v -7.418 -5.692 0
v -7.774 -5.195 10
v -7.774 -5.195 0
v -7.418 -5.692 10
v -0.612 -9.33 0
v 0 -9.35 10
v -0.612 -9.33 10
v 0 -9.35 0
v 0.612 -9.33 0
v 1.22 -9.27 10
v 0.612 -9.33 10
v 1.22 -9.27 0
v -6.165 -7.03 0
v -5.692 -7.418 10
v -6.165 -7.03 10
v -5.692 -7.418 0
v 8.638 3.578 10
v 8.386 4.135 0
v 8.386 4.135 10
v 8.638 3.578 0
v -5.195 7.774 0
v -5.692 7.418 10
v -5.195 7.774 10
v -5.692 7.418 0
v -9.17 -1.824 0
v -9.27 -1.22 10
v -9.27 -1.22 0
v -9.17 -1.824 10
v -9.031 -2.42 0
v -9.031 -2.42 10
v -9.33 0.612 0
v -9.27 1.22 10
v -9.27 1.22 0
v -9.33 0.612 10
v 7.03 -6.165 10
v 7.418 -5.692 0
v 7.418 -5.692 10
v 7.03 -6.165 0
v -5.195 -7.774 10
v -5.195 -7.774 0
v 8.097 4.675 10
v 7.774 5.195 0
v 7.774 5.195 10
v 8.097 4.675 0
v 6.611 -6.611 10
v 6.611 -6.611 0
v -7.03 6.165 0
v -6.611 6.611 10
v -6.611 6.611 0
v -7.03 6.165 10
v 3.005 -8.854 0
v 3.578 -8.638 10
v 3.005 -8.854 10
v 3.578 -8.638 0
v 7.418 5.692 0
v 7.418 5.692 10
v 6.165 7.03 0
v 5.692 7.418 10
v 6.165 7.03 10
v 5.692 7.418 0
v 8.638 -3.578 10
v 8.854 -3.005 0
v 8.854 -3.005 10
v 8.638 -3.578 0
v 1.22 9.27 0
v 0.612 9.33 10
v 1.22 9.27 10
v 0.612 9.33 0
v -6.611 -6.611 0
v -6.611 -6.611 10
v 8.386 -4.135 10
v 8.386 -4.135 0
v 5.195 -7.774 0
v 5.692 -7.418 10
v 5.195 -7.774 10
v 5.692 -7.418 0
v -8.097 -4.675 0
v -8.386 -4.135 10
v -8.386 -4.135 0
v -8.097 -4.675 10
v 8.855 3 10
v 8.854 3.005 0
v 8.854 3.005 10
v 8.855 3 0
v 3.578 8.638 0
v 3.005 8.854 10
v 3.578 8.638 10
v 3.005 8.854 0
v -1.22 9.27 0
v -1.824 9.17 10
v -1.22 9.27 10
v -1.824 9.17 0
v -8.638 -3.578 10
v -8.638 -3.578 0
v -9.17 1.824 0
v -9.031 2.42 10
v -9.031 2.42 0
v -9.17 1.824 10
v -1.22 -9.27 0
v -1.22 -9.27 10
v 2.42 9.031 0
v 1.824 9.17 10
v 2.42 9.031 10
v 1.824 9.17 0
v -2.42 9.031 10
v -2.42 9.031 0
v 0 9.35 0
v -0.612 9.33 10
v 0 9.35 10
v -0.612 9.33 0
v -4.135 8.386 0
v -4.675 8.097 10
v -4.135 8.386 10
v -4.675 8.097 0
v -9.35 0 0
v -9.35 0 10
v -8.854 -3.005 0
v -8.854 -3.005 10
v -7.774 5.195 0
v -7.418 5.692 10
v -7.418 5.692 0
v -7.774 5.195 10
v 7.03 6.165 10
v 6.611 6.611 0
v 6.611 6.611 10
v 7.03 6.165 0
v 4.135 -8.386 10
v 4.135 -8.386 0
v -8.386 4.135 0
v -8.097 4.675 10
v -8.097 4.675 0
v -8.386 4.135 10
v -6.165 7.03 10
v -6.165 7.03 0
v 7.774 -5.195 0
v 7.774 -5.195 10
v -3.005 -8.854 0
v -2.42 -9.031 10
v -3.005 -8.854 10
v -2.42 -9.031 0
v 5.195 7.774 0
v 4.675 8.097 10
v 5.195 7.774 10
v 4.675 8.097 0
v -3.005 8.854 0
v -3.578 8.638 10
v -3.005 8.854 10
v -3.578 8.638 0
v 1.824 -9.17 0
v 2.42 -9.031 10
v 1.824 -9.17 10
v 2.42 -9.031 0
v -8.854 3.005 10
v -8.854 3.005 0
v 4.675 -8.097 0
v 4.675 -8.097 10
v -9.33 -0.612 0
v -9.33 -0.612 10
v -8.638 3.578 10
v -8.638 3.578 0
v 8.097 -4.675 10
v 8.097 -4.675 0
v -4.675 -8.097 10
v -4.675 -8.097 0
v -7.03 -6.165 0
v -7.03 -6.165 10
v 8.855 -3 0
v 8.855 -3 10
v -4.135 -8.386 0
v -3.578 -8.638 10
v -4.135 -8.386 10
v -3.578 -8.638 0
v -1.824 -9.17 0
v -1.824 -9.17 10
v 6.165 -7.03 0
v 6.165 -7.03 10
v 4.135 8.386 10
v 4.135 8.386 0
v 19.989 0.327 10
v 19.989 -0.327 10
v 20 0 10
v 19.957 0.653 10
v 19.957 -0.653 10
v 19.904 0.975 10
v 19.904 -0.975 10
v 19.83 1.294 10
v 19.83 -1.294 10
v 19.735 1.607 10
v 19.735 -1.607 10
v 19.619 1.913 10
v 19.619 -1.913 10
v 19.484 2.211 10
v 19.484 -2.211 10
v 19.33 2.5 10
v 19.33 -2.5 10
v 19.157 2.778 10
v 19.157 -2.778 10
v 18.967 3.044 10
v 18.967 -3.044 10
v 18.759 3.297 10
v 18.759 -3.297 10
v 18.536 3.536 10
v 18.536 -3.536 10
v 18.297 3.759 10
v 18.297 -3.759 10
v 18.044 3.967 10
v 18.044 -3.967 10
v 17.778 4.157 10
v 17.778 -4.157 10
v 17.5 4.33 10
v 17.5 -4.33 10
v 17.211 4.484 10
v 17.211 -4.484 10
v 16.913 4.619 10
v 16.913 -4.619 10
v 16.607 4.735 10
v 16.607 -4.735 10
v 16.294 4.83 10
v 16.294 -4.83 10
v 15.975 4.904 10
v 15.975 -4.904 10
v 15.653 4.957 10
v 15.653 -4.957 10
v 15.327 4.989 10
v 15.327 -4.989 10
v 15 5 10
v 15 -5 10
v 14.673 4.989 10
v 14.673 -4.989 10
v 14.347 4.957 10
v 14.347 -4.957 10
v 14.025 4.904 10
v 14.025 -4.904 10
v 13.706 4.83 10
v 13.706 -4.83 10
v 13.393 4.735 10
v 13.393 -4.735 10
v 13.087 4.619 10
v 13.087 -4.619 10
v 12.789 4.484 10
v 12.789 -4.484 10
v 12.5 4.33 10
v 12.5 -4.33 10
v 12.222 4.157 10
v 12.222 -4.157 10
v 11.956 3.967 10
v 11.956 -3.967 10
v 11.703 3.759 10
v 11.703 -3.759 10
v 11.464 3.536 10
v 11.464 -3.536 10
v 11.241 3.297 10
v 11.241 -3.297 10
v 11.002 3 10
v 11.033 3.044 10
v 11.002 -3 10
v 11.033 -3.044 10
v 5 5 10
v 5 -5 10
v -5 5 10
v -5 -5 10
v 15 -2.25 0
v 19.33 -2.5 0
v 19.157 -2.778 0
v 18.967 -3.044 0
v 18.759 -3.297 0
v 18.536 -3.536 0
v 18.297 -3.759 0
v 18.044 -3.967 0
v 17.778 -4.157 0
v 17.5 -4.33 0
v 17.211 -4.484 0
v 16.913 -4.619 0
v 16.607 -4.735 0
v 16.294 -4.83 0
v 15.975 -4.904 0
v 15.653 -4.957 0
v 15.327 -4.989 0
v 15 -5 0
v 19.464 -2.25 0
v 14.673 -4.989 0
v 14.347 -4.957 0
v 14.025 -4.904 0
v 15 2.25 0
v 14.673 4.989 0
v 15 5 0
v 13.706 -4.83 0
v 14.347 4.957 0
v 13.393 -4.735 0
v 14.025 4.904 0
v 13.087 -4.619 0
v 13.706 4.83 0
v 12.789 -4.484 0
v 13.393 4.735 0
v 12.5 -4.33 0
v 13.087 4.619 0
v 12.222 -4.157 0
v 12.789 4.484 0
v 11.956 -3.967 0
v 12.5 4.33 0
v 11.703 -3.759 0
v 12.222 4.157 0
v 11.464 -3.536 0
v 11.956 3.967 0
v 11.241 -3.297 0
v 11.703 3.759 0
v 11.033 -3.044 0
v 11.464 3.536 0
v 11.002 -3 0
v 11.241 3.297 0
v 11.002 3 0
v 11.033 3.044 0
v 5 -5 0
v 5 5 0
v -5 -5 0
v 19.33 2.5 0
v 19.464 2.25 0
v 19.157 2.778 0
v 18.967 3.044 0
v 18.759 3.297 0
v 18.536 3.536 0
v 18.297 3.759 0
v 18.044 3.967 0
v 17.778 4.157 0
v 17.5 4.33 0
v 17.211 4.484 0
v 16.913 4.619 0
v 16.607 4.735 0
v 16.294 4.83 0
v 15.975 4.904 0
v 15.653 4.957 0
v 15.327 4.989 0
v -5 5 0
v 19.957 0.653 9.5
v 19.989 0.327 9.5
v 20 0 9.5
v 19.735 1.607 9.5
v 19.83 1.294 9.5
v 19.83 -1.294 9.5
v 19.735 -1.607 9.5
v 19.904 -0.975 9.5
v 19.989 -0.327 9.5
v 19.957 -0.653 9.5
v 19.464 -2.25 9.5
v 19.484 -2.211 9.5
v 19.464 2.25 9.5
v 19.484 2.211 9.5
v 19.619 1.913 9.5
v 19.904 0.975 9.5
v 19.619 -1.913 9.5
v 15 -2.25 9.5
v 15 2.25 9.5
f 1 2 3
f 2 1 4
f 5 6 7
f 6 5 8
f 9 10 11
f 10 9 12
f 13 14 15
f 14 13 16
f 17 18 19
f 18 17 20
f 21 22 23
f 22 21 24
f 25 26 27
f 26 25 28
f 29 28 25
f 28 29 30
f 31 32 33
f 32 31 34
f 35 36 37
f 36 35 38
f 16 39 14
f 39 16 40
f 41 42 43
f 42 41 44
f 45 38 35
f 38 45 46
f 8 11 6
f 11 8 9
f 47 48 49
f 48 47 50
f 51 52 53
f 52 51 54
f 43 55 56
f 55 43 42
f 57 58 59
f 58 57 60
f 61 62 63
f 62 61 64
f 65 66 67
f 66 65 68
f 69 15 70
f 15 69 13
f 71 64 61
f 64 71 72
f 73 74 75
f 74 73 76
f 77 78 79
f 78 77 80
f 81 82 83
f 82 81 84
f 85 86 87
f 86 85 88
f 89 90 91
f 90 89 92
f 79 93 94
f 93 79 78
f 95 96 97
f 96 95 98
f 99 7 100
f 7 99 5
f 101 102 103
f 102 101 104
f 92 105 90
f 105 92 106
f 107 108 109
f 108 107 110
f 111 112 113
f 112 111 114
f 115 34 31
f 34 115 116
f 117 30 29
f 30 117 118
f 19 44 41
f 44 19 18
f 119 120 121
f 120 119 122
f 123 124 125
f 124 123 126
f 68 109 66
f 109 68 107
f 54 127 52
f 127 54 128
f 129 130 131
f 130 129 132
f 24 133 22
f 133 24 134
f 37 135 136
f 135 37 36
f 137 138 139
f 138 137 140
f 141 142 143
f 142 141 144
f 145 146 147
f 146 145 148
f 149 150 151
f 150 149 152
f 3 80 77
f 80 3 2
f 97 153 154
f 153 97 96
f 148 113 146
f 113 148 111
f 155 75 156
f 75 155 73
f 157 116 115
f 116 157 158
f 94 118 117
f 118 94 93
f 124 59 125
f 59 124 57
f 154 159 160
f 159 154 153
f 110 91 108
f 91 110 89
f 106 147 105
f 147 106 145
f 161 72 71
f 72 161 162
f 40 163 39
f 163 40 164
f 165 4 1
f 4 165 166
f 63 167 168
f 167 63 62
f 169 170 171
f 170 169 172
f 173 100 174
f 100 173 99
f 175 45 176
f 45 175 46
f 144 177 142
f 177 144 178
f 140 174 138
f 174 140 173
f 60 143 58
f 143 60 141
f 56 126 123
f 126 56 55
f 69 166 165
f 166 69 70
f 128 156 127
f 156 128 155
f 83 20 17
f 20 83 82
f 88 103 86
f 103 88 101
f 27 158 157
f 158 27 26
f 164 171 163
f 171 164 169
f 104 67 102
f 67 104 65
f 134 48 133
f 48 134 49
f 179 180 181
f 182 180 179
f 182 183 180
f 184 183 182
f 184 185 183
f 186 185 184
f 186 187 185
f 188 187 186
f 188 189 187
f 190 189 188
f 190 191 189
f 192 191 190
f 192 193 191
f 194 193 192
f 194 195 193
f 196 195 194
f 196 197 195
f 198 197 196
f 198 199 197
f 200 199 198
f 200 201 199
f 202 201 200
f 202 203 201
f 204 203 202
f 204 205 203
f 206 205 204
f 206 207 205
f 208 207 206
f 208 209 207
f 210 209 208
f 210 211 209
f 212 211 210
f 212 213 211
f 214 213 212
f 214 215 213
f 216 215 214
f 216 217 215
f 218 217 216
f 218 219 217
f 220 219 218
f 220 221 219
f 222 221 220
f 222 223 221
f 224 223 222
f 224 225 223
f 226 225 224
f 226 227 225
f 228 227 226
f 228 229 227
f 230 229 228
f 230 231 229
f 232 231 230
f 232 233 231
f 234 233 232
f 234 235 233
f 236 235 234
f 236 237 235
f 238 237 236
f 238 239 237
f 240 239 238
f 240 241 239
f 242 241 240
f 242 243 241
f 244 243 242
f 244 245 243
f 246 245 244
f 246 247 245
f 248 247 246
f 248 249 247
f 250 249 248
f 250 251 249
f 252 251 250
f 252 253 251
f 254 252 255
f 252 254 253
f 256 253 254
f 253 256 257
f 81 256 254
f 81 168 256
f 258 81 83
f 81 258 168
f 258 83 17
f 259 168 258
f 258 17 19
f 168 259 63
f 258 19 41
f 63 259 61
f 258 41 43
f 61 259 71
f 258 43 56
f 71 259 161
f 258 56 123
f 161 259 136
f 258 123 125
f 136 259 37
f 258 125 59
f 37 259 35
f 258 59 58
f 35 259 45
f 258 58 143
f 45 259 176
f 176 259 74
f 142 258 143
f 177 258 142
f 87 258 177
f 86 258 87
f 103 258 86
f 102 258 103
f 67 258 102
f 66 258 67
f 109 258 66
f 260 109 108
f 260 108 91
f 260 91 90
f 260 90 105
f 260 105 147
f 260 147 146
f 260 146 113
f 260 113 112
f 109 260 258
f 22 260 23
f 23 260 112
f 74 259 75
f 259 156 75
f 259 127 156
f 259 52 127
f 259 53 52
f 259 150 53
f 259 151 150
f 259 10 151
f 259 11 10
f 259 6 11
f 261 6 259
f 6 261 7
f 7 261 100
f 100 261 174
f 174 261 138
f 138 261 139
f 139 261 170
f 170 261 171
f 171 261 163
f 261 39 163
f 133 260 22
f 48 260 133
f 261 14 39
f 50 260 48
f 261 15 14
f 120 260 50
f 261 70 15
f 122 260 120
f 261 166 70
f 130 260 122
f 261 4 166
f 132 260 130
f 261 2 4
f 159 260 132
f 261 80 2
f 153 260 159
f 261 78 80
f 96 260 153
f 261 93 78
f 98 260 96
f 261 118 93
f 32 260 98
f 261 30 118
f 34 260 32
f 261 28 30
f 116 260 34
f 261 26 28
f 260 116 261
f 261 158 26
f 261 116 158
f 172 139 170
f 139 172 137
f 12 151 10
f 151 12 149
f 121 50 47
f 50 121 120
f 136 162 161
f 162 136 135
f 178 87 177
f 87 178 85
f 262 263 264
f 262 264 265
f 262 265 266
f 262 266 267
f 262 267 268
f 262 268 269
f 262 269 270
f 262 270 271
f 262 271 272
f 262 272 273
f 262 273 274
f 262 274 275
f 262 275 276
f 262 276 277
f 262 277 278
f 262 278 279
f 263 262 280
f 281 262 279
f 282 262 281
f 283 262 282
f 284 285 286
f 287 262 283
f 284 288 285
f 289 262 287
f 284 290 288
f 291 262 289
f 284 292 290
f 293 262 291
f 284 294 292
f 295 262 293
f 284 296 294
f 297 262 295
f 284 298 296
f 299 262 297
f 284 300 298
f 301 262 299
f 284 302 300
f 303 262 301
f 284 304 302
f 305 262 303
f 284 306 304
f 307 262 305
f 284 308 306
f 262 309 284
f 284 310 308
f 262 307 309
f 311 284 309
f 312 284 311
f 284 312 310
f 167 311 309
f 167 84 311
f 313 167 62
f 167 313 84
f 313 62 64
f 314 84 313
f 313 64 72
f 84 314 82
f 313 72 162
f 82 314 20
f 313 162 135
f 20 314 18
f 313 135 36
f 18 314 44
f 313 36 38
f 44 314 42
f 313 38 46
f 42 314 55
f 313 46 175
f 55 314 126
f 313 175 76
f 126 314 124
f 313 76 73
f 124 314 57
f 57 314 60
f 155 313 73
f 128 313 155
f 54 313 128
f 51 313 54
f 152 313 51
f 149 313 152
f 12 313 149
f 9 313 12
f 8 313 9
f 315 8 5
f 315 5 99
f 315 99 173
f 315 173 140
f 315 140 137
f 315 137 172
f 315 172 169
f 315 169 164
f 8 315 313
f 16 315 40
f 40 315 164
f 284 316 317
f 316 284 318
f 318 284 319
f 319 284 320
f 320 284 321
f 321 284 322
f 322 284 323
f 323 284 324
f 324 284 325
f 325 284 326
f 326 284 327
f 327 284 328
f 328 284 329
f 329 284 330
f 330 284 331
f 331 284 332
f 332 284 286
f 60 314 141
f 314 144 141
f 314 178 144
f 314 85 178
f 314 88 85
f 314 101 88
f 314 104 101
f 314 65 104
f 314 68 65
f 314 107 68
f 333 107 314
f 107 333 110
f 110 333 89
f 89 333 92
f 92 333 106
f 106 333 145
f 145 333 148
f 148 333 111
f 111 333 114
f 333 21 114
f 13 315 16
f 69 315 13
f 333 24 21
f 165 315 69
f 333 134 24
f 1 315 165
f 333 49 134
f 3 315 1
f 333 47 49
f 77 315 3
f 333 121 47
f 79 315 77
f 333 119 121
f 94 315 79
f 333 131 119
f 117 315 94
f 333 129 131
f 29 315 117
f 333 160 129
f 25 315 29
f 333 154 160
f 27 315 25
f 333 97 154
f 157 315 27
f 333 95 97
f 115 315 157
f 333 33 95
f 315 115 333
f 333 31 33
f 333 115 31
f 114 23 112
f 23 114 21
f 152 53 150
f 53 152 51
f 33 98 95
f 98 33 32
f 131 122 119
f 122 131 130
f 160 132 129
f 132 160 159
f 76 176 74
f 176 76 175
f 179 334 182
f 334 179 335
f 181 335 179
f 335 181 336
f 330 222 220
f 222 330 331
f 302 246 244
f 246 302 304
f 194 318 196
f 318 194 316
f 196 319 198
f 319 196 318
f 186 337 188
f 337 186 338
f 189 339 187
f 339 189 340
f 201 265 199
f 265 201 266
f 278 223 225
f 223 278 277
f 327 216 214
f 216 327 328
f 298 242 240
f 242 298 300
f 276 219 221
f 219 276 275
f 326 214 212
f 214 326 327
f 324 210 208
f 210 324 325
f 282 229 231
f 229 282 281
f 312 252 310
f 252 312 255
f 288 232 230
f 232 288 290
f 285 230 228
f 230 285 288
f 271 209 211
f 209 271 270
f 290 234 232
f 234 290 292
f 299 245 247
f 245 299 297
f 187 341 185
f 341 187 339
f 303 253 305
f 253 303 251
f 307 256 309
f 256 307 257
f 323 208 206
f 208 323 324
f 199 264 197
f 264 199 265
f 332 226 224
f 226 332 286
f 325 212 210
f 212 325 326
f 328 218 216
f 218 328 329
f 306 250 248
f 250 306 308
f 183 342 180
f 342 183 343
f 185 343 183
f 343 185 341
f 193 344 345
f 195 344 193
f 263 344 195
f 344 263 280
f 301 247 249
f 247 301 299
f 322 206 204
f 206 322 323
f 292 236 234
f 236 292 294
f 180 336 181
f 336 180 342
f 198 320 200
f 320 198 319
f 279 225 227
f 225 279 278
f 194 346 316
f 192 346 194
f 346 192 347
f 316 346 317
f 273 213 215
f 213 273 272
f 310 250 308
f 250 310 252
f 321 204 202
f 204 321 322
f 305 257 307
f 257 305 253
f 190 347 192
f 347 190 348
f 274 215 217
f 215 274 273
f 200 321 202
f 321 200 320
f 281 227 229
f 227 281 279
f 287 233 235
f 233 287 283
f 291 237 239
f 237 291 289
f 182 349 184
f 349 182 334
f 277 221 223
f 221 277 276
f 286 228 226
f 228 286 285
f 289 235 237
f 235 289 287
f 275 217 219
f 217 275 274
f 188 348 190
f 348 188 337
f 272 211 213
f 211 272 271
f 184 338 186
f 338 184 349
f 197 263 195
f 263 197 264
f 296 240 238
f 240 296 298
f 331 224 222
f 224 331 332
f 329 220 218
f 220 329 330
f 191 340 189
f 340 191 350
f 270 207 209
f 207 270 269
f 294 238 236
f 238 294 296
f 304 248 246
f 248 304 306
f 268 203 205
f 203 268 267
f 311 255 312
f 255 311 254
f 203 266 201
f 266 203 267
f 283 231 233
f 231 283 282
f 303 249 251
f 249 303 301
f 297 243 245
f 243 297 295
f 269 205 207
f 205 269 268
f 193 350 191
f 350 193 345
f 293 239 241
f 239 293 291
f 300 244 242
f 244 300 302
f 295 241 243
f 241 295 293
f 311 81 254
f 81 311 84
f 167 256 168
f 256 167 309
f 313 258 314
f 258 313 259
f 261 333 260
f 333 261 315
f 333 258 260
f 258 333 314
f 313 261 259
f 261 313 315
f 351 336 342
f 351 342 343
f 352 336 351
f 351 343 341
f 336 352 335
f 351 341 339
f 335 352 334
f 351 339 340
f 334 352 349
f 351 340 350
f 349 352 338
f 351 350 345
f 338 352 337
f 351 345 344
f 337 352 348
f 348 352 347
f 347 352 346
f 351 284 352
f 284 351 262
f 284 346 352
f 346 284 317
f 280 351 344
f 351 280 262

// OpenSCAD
// Tubing organiser clip for a 12.7 mm lab stand rod
// Print orientation: flat on the bed, builds up in +Z

// ---------------- Parameters ----------------
rod_d      = 12.7;   // stand rod diameter
rod_wall   = 3;      // stand rod wall thickness
rod_outer  = rod_d + 2 * rod_wall;  // 18.7 mm outer diameter of rod ring

tub_d      = 6;      // tubing inner diameter
tub_wall   = 2;      // tubing wall thickness
tub_outer  = tub_d + 2 * tub_wall;  // 10 mm outer diameter of tubing ring

bridge_w   = 6;      // bridge width in Y
bridge_x0  = 8;      // bridge start in X
bridge_x1  = 12;     // bridge end in X

opening_rod = 10;    // width of opening cut from -X side of rod ring
opening_tub = 4.5;   // width of opening cut from +X side of tubing ring

eps        = 0.5;    // overcut for clean differences
$fn        = 96;     // curve resolution

// ---------------- Model ----------------
difference() {
    union() {
        // Rod ring, centred at origin
        cylinder(d = rod_outer, h = 10);

        // Tubing ring, centred at x = 15, y = 0
        translate([15, 0, 0])
            cylinder(d = tub_outer, h = 10);

        // Solid bridge between x = 8 and x = 12
        translate([bridge_x0, -bridge_w / 2, 0])
            cube([bridge_x1 - bridge_x0, bridge_w, 10]);
    }

    // Opening in rod ring: x < 0 and -5 < y < 5
    translate([-opening_rod / 2, -5, -eps])
        cube([opening_rod, 10, 10 + 2 * eps]);

    // Opening in tubing ring: x > 15 and -2.25 < y < 2.25
    translate([15, -opening_tub / 2, -eps])
        cube([10 + 2 * eps, opening_tub, 10]);
}
